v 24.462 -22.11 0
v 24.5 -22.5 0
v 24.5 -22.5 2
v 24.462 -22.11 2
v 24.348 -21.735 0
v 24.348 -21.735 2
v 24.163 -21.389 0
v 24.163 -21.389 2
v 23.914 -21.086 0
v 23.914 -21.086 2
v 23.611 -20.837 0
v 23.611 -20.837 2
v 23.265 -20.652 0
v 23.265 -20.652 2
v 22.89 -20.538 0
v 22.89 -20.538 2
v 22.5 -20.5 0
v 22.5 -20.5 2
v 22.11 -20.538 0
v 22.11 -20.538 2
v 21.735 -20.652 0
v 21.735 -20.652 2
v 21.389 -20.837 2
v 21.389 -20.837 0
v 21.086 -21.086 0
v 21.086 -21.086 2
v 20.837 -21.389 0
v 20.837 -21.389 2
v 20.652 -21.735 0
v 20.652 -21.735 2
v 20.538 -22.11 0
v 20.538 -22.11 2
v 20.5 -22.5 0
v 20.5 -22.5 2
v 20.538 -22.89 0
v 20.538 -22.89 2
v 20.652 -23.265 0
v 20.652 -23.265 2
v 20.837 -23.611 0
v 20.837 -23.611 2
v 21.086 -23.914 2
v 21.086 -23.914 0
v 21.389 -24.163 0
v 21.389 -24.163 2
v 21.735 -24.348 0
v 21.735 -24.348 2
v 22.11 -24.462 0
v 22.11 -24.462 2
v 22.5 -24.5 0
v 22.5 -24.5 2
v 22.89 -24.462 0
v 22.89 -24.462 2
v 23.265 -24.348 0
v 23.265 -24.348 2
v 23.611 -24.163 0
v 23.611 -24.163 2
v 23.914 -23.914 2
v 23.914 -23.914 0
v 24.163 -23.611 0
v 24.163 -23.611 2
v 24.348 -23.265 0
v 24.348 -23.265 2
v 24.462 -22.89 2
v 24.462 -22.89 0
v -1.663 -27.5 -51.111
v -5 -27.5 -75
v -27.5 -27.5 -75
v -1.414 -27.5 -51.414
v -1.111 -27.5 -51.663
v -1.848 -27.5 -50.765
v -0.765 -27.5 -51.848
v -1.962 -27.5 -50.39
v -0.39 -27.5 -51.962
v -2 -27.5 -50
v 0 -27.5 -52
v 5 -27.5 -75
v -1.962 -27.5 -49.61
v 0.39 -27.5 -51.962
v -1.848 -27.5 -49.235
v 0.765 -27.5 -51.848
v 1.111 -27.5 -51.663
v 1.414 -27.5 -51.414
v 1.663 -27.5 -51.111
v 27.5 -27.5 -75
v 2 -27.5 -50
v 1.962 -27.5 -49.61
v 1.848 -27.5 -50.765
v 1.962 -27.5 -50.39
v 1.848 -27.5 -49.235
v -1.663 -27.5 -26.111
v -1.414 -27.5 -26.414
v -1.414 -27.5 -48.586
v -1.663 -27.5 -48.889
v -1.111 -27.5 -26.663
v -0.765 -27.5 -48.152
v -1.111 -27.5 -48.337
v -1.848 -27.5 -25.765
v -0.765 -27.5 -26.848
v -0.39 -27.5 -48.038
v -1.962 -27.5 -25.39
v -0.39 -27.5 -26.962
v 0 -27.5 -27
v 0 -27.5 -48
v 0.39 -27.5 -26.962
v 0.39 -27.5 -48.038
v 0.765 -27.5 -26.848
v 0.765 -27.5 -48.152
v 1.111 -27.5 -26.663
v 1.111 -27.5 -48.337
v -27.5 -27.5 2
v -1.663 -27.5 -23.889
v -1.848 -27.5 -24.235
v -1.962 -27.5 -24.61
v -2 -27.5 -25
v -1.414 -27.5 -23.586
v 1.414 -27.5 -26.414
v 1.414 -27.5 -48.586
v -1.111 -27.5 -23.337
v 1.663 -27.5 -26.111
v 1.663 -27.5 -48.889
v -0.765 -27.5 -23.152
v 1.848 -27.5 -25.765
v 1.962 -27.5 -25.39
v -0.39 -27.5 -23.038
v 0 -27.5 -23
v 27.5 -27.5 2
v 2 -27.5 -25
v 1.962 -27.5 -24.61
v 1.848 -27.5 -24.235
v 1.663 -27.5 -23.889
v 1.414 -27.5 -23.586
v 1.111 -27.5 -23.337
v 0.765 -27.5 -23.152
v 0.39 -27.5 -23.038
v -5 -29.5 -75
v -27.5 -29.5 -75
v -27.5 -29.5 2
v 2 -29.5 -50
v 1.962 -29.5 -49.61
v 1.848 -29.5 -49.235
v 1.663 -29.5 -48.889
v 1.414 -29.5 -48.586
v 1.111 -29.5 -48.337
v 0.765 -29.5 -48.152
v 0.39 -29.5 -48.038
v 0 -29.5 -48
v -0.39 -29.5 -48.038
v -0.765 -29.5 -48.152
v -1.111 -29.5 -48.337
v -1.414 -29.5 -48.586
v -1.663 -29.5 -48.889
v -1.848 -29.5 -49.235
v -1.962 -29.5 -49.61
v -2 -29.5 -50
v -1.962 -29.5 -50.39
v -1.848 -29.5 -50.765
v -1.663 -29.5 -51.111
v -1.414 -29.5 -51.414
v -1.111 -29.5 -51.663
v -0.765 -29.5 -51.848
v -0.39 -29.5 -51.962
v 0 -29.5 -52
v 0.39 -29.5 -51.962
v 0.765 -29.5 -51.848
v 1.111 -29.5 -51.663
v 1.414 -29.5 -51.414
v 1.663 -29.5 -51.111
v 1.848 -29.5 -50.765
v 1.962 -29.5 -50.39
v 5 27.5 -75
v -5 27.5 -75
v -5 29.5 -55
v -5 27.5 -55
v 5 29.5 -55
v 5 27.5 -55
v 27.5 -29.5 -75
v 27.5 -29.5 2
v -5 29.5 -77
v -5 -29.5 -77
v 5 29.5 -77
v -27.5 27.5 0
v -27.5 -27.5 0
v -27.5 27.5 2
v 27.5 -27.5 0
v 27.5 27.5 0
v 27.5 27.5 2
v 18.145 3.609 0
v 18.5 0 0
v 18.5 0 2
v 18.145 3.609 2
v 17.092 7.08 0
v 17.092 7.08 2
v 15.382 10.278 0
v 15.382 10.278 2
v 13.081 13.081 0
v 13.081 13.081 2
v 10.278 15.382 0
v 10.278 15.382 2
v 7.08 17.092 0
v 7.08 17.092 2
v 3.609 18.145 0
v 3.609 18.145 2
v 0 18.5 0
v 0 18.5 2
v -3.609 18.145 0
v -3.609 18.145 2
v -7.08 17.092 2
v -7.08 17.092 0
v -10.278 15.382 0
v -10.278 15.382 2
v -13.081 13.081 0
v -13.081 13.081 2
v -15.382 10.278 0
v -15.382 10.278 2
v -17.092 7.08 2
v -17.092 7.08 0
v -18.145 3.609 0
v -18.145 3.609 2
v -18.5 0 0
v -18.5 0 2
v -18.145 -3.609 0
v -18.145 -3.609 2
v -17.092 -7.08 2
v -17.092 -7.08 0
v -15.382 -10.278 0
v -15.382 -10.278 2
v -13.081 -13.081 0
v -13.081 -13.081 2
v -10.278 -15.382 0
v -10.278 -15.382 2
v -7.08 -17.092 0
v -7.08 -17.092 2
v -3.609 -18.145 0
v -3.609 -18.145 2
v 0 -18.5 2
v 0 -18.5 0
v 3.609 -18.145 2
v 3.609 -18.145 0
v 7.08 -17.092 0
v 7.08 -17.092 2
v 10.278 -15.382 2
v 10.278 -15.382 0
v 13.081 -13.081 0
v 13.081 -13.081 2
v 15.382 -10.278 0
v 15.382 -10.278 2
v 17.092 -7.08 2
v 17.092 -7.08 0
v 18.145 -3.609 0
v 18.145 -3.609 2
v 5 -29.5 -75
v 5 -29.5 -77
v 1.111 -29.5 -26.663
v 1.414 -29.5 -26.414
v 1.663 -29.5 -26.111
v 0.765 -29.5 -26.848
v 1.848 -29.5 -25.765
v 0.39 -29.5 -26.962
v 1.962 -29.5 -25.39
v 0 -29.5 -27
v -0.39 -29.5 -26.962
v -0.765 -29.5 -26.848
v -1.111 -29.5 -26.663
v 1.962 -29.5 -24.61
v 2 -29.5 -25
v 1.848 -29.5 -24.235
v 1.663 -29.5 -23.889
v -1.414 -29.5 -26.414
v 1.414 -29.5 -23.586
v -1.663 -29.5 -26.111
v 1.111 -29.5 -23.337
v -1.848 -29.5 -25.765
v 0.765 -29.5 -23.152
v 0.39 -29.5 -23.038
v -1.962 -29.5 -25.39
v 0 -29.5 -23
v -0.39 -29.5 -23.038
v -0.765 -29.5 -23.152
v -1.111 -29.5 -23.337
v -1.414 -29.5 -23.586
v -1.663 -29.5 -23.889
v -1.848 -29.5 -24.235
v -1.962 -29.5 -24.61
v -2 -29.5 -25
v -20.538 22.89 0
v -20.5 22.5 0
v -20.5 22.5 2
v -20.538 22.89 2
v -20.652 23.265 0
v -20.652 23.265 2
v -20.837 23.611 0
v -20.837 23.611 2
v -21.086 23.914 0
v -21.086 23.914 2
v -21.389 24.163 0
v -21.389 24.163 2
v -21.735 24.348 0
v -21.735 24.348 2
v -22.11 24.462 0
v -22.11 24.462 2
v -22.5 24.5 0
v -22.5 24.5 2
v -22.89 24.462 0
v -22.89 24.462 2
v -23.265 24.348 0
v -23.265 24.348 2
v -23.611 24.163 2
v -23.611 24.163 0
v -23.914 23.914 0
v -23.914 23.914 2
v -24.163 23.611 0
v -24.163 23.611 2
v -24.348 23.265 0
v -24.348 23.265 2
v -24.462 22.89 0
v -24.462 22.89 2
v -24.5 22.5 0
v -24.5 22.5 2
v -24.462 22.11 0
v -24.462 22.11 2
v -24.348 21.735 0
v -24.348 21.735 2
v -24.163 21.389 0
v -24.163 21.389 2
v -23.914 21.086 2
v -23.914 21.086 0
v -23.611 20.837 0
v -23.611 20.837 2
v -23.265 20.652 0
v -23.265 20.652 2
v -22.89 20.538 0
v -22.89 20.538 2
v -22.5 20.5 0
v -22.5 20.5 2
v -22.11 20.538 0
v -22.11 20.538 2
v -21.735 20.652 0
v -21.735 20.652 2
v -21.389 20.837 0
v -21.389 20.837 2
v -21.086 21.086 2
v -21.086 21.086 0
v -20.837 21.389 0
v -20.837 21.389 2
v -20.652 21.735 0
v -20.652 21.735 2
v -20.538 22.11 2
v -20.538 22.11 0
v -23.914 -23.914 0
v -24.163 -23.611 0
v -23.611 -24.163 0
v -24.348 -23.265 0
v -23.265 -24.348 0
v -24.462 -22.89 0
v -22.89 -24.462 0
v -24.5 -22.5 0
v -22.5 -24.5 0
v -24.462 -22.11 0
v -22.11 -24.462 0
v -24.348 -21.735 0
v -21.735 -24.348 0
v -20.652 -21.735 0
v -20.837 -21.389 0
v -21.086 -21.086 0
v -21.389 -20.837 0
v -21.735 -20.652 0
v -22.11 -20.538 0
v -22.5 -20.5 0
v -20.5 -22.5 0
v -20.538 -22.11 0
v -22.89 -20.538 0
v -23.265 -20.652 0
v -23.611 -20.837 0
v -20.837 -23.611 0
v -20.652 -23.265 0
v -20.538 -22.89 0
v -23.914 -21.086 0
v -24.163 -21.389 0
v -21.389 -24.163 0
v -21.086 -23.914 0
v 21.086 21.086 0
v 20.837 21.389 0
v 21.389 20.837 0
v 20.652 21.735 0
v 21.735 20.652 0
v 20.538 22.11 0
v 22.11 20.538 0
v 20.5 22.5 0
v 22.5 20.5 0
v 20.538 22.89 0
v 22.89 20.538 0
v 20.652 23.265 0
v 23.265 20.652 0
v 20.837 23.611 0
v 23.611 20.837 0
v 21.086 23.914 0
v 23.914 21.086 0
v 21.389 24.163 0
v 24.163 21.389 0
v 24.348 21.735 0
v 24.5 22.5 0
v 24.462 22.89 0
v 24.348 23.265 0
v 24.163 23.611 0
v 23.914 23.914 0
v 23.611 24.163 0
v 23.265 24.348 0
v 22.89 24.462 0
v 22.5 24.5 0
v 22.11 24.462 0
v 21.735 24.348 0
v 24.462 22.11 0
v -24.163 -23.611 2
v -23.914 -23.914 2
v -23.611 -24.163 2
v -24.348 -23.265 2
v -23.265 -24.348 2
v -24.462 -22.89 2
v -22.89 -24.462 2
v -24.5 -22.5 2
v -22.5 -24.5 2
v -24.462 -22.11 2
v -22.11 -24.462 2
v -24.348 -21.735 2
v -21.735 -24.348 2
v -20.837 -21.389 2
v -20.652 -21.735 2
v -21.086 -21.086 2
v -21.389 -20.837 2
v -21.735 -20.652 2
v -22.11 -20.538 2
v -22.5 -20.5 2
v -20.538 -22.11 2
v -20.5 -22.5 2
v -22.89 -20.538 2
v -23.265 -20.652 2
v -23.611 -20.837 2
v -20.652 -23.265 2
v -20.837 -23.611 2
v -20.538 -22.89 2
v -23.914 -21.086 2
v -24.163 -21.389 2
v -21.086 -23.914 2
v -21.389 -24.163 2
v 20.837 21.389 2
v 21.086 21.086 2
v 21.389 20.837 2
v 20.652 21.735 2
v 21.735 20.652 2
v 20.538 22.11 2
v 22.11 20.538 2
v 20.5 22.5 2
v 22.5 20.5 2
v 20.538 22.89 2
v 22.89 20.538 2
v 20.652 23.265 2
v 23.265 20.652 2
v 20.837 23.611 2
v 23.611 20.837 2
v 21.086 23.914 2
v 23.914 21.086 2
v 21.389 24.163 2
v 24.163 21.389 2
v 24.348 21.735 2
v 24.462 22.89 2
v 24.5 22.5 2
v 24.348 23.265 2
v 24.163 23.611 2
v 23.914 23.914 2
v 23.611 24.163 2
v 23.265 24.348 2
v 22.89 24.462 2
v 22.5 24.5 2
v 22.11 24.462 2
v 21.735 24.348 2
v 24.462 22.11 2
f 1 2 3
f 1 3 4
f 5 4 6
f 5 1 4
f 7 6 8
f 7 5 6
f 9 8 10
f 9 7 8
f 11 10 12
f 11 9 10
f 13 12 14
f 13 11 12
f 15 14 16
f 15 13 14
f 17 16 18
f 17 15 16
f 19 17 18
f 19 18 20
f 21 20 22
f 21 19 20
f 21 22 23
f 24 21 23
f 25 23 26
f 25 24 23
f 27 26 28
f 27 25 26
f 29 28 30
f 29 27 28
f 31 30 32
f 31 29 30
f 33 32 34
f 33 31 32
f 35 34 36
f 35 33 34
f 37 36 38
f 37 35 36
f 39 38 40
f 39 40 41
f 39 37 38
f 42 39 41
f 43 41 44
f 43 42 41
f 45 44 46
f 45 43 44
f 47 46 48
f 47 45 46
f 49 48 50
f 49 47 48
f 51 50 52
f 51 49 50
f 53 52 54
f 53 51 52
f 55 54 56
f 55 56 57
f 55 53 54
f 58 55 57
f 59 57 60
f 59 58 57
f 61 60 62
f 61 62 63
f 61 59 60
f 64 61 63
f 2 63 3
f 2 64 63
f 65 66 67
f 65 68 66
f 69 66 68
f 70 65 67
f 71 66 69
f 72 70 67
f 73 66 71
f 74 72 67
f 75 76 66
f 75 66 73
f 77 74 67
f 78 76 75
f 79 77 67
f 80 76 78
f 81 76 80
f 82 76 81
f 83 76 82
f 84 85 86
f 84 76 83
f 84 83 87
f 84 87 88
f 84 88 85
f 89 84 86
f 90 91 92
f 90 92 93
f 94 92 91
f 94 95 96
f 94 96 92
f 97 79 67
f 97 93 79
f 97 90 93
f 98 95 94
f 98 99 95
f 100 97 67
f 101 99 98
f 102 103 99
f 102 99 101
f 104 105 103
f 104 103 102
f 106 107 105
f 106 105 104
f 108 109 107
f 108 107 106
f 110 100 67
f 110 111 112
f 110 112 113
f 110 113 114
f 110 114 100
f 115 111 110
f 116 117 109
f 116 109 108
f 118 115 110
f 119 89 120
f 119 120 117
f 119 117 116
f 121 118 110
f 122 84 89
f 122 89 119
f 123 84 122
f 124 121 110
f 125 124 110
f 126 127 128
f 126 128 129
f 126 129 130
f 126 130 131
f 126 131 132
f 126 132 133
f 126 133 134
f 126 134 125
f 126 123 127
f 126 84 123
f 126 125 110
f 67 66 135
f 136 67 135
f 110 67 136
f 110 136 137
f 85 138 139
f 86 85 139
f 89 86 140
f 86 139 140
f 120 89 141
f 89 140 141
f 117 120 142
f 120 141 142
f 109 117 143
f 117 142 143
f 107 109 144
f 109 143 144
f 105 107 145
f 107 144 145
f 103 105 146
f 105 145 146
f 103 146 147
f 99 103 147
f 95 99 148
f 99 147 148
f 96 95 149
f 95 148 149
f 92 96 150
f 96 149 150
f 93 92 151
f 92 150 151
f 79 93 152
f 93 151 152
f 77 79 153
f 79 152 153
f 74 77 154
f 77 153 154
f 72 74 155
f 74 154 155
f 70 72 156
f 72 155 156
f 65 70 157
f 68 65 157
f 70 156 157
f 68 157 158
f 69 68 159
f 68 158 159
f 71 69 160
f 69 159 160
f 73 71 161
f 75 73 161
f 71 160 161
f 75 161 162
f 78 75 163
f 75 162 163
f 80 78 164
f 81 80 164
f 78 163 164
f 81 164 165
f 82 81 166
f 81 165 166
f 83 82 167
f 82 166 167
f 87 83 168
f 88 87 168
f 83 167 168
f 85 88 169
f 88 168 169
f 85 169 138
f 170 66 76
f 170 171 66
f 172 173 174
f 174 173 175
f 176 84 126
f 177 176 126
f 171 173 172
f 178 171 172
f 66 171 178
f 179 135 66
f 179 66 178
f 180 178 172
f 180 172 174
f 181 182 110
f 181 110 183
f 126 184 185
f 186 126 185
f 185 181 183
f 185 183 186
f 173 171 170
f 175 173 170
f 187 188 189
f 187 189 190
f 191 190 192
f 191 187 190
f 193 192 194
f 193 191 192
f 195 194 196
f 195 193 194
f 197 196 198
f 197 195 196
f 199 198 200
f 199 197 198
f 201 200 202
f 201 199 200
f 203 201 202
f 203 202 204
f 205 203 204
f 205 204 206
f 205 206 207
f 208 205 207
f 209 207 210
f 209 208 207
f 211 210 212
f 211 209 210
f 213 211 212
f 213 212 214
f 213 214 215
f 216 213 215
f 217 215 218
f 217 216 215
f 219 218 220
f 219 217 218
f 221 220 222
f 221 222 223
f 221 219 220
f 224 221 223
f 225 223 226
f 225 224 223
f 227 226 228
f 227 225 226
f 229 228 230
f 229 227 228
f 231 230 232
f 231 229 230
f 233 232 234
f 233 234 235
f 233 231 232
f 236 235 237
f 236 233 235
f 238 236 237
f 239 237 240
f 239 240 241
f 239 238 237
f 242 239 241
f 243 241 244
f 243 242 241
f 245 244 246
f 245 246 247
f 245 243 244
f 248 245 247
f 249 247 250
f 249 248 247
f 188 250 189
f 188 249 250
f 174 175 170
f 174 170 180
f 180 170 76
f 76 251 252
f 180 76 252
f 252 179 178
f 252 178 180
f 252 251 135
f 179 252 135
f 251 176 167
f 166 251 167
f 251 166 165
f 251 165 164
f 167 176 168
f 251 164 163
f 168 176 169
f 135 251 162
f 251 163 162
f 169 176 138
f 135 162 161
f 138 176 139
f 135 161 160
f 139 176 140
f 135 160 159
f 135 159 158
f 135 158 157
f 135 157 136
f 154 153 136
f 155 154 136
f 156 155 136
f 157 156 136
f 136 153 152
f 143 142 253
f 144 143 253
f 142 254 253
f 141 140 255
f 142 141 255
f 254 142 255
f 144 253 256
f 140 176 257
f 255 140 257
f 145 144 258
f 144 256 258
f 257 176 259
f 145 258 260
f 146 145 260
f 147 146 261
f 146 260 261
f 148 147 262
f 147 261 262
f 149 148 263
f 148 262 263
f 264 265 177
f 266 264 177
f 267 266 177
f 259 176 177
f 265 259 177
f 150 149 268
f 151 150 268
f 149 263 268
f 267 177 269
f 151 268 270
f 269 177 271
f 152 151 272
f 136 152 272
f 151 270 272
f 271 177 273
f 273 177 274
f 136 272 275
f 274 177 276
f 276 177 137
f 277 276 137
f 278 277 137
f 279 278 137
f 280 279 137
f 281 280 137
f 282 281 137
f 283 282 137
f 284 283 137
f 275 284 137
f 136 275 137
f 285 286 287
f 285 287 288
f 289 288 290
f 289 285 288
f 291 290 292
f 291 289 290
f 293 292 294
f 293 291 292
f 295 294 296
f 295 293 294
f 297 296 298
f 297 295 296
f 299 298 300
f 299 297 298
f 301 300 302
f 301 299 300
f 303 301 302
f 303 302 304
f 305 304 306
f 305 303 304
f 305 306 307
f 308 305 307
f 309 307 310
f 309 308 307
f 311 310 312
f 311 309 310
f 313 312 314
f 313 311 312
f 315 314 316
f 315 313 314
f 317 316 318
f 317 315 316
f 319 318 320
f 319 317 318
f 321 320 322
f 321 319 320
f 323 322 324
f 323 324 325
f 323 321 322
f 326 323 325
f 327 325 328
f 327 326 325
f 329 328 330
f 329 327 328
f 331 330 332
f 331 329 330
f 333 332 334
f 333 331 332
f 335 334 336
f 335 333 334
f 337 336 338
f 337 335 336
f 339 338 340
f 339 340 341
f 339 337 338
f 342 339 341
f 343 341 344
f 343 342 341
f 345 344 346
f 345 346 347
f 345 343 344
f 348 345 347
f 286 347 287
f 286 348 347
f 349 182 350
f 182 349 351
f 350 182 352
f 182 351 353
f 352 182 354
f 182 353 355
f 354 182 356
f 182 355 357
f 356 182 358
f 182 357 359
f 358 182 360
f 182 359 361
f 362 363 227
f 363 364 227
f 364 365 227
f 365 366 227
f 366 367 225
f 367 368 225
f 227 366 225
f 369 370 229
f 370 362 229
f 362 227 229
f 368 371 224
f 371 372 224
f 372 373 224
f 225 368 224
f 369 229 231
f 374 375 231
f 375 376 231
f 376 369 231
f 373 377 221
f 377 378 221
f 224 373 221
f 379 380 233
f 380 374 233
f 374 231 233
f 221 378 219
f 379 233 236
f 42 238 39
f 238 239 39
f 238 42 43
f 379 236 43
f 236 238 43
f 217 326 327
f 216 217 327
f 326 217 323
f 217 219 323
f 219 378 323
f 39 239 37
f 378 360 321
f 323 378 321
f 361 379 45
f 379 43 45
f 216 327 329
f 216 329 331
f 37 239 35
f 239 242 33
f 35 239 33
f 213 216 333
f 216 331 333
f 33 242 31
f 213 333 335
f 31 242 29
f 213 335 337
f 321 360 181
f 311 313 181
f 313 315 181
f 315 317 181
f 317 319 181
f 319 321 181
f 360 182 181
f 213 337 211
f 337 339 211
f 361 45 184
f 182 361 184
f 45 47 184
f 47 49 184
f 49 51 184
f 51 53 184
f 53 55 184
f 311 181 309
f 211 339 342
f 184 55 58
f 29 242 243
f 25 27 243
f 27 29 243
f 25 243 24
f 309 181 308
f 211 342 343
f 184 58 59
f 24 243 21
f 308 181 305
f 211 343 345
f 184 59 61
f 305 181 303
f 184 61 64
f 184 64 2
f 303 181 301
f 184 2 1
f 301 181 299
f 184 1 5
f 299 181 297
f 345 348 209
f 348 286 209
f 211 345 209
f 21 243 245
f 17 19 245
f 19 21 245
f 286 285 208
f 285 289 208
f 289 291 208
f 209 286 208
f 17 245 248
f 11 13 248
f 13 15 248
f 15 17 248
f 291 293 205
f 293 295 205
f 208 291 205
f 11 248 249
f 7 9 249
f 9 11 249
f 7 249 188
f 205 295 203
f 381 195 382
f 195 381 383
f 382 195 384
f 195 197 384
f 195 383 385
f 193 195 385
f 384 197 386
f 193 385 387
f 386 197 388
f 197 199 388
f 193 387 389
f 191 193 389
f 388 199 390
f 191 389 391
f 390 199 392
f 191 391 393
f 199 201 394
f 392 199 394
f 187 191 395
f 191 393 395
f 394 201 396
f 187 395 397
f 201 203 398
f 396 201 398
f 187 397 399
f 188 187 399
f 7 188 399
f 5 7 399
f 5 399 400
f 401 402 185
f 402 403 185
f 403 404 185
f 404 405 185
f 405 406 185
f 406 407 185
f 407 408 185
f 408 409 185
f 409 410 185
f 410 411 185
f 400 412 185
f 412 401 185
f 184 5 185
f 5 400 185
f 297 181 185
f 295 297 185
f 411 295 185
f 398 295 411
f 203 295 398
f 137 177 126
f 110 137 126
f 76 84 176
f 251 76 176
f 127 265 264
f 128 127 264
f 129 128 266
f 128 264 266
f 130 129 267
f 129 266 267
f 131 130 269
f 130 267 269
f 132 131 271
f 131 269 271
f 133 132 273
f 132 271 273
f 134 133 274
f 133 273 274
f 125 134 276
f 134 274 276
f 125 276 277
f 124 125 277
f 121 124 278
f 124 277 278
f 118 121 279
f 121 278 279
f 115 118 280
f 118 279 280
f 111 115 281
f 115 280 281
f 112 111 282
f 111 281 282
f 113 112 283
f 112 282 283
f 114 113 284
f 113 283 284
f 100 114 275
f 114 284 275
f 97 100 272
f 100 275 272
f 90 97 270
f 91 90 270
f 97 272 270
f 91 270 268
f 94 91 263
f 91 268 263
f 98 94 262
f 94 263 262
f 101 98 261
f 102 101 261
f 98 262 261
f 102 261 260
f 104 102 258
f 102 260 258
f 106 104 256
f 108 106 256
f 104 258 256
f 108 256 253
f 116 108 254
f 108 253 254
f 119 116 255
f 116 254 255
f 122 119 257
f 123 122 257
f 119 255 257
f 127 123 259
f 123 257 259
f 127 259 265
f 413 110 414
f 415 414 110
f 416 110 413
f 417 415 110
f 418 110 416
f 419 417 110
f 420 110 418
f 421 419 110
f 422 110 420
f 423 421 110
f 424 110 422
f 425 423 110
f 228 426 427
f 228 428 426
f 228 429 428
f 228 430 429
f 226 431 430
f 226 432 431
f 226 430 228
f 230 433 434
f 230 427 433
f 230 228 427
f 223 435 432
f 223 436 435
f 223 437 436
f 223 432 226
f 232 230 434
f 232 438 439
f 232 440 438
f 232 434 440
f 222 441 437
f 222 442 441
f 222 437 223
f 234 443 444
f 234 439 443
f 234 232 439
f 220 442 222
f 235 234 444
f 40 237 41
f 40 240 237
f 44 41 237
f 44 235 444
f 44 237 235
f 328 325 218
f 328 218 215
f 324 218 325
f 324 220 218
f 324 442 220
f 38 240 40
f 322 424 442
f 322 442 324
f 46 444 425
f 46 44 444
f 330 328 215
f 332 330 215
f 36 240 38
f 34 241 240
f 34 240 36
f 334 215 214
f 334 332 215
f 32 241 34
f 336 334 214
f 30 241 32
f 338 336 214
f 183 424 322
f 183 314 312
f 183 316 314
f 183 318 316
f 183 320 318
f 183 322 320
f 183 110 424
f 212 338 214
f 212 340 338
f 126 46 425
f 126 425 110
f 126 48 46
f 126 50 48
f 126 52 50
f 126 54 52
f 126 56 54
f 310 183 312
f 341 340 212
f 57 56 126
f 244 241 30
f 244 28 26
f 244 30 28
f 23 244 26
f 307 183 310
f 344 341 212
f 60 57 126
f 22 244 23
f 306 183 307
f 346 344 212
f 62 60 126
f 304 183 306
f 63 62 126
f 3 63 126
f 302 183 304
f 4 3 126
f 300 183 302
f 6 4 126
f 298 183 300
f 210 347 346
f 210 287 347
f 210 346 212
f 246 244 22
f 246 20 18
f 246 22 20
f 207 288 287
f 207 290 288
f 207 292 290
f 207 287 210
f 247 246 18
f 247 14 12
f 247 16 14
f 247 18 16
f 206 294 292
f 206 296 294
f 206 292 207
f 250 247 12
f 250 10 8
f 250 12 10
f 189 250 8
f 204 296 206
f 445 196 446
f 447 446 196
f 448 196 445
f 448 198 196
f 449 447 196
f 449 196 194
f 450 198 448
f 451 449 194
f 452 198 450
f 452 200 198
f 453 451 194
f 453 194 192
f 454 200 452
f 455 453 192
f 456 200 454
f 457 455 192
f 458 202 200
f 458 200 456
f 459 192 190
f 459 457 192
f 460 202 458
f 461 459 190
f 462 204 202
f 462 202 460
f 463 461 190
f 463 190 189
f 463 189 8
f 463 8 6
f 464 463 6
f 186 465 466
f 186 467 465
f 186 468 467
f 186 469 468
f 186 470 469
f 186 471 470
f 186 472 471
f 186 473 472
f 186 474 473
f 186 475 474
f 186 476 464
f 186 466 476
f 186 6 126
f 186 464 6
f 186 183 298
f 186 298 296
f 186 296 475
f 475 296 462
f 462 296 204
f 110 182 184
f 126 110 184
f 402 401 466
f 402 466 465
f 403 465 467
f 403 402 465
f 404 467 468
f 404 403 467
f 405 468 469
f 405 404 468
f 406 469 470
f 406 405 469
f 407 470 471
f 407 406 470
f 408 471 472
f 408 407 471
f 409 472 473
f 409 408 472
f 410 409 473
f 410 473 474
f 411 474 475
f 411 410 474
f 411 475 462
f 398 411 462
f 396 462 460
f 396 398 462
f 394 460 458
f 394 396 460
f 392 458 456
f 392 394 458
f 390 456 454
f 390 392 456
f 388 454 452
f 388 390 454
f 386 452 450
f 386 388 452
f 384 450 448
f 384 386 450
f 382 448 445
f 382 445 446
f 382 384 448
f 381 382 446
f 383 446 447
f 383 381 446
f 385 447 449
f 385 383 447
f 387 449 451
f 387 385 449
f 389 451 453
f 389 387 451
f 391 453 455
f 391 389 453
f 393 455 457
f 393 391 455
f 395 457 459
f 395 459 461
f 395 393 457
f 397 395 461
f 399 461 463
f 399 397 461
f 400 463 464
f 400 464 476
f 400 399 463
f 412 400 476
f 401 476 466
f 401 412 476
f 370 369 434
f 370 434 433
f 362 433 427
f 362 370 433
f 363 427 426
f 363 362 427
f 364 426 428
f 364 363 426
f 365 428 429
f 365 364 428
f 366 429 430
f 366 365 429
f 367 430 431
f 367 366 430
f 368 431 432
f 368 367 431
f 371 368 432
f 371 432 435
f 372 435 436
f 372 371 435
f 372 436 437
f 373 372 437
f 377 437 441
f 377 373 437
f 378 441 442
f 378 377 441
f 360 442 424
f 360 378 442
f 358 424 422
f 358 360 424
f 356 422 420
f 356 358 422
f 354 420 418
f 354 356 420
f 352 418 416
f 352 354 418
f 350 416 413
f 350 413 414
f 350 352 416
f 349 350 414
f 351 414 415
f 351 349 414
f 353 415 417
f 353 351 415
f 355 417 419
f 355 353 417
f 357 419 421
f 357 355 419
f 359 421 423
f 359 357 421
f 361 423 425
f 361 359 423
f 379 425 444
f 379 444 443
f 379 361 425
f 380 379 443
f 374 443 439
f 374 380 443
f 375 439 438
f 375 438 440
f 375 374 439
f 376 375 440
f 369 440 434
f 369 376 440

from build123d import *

# Parameters (mm, degrees)
SKETCH1_W           = 55
SKETCH1_H           = 55
SKETCH1_R           = 2
SKETCH1_R_2         = 18.5
BOSS_EXTRUDE1_DEPTH = 2
BOSS_EXTRUDE2_DEPTH = 55
BOSS_EXTRUDE3_DEPTH = 2
SKETCH4_W           = 10
SKETCH4_H           = 22
BOSS_EXTRUDE4_DEPTH = 2
SKETCH5_R           = 2
CUT_EXTRUDE1_DEPTH  = 2


with BuildPart() as part:
    # Sketch1 → Boss-Extrude1 (new body)
    with BuildSketch(Plane.XY):
        Rectangle(SKETCH1_W, SKETCH1_H)
        with Locations((-22.5, 22.5)):
            Circle(SKETCH1_R, mode=Mode.SUBTRACT)
        with Locations((22.5, 22.5)):
            Circle(SKETCH1_R, mode=Mode.SUBTRACT)
        with Locations((-22.5, -22.5)):
            Circle(SKETCH1_R, mode=Mode.SUBTRACT)
        with Locations((22.5, -22.5)):
            Circle(SKETCH1_R, mode=Mode.SUBTRACT)
        Circle(SKETCH1_R_2, mode=Mode.SUBTRACT)
    extrude(amount=BOSS_EXTRUDE1_DEPTH)


with BuildPart() as body_2:
    # Sketch2 → Boss-Extrude2 (new body)
    with BuildSketch(Plane(origin=(27.5, 0, 0), x_dir=(0, 0, -1), z_dir=(1, 0, 0))):
        Polygon((0, -27.5), (75, -27.5), (75, -29.5), (-2, -29.5), (-2, -27.5), align=None)
    extrude(amount=-BOSS_EXTRUDE2_DEPTH)

    # Sketch3 → Boss-Extrude3 (add)
    with BuildSketch(Plane(origin=(0, 0, -75), x_dir=(-1, 0, 0), z_dir=(0, 0, -1))):
        Polygon((0, -29.5), (-5, -29.5), (-5, 27.5), (5, 27.5), (5, -29.5), align=None)
    extrude(amount=BOSS_EXTRUDE3_DEPTH)

    # Sketch4 → Boss-Extrude4 (add)
    with BuildSketch(Plane(origin=(0, 27.5, 0), x_dir=(1, 0, 0), z_dir=(0, 1, 0))):
        with Locations((0, 66)):
            Rectangle(SKETCH4_W, SKETCH4_H)
    extrude(amount=BOSS_EXTRUDE4_DEPTH)

    # Sketch5 → Cut-Extrude1 (cut)
    with BuildSketch(Plane.XZ.offset(29.5)):
        with Locations((0, -25)):
            Circle(SKETCH5_R)
        with Locations((0, -50)):
            Circle(SKETCH5_R)
    extrude(amount=-CUT_EXTRUDE1_DEPTH, mode=Mode.SUBTRACT)


solid = Compound([part.part, body_2.part])
